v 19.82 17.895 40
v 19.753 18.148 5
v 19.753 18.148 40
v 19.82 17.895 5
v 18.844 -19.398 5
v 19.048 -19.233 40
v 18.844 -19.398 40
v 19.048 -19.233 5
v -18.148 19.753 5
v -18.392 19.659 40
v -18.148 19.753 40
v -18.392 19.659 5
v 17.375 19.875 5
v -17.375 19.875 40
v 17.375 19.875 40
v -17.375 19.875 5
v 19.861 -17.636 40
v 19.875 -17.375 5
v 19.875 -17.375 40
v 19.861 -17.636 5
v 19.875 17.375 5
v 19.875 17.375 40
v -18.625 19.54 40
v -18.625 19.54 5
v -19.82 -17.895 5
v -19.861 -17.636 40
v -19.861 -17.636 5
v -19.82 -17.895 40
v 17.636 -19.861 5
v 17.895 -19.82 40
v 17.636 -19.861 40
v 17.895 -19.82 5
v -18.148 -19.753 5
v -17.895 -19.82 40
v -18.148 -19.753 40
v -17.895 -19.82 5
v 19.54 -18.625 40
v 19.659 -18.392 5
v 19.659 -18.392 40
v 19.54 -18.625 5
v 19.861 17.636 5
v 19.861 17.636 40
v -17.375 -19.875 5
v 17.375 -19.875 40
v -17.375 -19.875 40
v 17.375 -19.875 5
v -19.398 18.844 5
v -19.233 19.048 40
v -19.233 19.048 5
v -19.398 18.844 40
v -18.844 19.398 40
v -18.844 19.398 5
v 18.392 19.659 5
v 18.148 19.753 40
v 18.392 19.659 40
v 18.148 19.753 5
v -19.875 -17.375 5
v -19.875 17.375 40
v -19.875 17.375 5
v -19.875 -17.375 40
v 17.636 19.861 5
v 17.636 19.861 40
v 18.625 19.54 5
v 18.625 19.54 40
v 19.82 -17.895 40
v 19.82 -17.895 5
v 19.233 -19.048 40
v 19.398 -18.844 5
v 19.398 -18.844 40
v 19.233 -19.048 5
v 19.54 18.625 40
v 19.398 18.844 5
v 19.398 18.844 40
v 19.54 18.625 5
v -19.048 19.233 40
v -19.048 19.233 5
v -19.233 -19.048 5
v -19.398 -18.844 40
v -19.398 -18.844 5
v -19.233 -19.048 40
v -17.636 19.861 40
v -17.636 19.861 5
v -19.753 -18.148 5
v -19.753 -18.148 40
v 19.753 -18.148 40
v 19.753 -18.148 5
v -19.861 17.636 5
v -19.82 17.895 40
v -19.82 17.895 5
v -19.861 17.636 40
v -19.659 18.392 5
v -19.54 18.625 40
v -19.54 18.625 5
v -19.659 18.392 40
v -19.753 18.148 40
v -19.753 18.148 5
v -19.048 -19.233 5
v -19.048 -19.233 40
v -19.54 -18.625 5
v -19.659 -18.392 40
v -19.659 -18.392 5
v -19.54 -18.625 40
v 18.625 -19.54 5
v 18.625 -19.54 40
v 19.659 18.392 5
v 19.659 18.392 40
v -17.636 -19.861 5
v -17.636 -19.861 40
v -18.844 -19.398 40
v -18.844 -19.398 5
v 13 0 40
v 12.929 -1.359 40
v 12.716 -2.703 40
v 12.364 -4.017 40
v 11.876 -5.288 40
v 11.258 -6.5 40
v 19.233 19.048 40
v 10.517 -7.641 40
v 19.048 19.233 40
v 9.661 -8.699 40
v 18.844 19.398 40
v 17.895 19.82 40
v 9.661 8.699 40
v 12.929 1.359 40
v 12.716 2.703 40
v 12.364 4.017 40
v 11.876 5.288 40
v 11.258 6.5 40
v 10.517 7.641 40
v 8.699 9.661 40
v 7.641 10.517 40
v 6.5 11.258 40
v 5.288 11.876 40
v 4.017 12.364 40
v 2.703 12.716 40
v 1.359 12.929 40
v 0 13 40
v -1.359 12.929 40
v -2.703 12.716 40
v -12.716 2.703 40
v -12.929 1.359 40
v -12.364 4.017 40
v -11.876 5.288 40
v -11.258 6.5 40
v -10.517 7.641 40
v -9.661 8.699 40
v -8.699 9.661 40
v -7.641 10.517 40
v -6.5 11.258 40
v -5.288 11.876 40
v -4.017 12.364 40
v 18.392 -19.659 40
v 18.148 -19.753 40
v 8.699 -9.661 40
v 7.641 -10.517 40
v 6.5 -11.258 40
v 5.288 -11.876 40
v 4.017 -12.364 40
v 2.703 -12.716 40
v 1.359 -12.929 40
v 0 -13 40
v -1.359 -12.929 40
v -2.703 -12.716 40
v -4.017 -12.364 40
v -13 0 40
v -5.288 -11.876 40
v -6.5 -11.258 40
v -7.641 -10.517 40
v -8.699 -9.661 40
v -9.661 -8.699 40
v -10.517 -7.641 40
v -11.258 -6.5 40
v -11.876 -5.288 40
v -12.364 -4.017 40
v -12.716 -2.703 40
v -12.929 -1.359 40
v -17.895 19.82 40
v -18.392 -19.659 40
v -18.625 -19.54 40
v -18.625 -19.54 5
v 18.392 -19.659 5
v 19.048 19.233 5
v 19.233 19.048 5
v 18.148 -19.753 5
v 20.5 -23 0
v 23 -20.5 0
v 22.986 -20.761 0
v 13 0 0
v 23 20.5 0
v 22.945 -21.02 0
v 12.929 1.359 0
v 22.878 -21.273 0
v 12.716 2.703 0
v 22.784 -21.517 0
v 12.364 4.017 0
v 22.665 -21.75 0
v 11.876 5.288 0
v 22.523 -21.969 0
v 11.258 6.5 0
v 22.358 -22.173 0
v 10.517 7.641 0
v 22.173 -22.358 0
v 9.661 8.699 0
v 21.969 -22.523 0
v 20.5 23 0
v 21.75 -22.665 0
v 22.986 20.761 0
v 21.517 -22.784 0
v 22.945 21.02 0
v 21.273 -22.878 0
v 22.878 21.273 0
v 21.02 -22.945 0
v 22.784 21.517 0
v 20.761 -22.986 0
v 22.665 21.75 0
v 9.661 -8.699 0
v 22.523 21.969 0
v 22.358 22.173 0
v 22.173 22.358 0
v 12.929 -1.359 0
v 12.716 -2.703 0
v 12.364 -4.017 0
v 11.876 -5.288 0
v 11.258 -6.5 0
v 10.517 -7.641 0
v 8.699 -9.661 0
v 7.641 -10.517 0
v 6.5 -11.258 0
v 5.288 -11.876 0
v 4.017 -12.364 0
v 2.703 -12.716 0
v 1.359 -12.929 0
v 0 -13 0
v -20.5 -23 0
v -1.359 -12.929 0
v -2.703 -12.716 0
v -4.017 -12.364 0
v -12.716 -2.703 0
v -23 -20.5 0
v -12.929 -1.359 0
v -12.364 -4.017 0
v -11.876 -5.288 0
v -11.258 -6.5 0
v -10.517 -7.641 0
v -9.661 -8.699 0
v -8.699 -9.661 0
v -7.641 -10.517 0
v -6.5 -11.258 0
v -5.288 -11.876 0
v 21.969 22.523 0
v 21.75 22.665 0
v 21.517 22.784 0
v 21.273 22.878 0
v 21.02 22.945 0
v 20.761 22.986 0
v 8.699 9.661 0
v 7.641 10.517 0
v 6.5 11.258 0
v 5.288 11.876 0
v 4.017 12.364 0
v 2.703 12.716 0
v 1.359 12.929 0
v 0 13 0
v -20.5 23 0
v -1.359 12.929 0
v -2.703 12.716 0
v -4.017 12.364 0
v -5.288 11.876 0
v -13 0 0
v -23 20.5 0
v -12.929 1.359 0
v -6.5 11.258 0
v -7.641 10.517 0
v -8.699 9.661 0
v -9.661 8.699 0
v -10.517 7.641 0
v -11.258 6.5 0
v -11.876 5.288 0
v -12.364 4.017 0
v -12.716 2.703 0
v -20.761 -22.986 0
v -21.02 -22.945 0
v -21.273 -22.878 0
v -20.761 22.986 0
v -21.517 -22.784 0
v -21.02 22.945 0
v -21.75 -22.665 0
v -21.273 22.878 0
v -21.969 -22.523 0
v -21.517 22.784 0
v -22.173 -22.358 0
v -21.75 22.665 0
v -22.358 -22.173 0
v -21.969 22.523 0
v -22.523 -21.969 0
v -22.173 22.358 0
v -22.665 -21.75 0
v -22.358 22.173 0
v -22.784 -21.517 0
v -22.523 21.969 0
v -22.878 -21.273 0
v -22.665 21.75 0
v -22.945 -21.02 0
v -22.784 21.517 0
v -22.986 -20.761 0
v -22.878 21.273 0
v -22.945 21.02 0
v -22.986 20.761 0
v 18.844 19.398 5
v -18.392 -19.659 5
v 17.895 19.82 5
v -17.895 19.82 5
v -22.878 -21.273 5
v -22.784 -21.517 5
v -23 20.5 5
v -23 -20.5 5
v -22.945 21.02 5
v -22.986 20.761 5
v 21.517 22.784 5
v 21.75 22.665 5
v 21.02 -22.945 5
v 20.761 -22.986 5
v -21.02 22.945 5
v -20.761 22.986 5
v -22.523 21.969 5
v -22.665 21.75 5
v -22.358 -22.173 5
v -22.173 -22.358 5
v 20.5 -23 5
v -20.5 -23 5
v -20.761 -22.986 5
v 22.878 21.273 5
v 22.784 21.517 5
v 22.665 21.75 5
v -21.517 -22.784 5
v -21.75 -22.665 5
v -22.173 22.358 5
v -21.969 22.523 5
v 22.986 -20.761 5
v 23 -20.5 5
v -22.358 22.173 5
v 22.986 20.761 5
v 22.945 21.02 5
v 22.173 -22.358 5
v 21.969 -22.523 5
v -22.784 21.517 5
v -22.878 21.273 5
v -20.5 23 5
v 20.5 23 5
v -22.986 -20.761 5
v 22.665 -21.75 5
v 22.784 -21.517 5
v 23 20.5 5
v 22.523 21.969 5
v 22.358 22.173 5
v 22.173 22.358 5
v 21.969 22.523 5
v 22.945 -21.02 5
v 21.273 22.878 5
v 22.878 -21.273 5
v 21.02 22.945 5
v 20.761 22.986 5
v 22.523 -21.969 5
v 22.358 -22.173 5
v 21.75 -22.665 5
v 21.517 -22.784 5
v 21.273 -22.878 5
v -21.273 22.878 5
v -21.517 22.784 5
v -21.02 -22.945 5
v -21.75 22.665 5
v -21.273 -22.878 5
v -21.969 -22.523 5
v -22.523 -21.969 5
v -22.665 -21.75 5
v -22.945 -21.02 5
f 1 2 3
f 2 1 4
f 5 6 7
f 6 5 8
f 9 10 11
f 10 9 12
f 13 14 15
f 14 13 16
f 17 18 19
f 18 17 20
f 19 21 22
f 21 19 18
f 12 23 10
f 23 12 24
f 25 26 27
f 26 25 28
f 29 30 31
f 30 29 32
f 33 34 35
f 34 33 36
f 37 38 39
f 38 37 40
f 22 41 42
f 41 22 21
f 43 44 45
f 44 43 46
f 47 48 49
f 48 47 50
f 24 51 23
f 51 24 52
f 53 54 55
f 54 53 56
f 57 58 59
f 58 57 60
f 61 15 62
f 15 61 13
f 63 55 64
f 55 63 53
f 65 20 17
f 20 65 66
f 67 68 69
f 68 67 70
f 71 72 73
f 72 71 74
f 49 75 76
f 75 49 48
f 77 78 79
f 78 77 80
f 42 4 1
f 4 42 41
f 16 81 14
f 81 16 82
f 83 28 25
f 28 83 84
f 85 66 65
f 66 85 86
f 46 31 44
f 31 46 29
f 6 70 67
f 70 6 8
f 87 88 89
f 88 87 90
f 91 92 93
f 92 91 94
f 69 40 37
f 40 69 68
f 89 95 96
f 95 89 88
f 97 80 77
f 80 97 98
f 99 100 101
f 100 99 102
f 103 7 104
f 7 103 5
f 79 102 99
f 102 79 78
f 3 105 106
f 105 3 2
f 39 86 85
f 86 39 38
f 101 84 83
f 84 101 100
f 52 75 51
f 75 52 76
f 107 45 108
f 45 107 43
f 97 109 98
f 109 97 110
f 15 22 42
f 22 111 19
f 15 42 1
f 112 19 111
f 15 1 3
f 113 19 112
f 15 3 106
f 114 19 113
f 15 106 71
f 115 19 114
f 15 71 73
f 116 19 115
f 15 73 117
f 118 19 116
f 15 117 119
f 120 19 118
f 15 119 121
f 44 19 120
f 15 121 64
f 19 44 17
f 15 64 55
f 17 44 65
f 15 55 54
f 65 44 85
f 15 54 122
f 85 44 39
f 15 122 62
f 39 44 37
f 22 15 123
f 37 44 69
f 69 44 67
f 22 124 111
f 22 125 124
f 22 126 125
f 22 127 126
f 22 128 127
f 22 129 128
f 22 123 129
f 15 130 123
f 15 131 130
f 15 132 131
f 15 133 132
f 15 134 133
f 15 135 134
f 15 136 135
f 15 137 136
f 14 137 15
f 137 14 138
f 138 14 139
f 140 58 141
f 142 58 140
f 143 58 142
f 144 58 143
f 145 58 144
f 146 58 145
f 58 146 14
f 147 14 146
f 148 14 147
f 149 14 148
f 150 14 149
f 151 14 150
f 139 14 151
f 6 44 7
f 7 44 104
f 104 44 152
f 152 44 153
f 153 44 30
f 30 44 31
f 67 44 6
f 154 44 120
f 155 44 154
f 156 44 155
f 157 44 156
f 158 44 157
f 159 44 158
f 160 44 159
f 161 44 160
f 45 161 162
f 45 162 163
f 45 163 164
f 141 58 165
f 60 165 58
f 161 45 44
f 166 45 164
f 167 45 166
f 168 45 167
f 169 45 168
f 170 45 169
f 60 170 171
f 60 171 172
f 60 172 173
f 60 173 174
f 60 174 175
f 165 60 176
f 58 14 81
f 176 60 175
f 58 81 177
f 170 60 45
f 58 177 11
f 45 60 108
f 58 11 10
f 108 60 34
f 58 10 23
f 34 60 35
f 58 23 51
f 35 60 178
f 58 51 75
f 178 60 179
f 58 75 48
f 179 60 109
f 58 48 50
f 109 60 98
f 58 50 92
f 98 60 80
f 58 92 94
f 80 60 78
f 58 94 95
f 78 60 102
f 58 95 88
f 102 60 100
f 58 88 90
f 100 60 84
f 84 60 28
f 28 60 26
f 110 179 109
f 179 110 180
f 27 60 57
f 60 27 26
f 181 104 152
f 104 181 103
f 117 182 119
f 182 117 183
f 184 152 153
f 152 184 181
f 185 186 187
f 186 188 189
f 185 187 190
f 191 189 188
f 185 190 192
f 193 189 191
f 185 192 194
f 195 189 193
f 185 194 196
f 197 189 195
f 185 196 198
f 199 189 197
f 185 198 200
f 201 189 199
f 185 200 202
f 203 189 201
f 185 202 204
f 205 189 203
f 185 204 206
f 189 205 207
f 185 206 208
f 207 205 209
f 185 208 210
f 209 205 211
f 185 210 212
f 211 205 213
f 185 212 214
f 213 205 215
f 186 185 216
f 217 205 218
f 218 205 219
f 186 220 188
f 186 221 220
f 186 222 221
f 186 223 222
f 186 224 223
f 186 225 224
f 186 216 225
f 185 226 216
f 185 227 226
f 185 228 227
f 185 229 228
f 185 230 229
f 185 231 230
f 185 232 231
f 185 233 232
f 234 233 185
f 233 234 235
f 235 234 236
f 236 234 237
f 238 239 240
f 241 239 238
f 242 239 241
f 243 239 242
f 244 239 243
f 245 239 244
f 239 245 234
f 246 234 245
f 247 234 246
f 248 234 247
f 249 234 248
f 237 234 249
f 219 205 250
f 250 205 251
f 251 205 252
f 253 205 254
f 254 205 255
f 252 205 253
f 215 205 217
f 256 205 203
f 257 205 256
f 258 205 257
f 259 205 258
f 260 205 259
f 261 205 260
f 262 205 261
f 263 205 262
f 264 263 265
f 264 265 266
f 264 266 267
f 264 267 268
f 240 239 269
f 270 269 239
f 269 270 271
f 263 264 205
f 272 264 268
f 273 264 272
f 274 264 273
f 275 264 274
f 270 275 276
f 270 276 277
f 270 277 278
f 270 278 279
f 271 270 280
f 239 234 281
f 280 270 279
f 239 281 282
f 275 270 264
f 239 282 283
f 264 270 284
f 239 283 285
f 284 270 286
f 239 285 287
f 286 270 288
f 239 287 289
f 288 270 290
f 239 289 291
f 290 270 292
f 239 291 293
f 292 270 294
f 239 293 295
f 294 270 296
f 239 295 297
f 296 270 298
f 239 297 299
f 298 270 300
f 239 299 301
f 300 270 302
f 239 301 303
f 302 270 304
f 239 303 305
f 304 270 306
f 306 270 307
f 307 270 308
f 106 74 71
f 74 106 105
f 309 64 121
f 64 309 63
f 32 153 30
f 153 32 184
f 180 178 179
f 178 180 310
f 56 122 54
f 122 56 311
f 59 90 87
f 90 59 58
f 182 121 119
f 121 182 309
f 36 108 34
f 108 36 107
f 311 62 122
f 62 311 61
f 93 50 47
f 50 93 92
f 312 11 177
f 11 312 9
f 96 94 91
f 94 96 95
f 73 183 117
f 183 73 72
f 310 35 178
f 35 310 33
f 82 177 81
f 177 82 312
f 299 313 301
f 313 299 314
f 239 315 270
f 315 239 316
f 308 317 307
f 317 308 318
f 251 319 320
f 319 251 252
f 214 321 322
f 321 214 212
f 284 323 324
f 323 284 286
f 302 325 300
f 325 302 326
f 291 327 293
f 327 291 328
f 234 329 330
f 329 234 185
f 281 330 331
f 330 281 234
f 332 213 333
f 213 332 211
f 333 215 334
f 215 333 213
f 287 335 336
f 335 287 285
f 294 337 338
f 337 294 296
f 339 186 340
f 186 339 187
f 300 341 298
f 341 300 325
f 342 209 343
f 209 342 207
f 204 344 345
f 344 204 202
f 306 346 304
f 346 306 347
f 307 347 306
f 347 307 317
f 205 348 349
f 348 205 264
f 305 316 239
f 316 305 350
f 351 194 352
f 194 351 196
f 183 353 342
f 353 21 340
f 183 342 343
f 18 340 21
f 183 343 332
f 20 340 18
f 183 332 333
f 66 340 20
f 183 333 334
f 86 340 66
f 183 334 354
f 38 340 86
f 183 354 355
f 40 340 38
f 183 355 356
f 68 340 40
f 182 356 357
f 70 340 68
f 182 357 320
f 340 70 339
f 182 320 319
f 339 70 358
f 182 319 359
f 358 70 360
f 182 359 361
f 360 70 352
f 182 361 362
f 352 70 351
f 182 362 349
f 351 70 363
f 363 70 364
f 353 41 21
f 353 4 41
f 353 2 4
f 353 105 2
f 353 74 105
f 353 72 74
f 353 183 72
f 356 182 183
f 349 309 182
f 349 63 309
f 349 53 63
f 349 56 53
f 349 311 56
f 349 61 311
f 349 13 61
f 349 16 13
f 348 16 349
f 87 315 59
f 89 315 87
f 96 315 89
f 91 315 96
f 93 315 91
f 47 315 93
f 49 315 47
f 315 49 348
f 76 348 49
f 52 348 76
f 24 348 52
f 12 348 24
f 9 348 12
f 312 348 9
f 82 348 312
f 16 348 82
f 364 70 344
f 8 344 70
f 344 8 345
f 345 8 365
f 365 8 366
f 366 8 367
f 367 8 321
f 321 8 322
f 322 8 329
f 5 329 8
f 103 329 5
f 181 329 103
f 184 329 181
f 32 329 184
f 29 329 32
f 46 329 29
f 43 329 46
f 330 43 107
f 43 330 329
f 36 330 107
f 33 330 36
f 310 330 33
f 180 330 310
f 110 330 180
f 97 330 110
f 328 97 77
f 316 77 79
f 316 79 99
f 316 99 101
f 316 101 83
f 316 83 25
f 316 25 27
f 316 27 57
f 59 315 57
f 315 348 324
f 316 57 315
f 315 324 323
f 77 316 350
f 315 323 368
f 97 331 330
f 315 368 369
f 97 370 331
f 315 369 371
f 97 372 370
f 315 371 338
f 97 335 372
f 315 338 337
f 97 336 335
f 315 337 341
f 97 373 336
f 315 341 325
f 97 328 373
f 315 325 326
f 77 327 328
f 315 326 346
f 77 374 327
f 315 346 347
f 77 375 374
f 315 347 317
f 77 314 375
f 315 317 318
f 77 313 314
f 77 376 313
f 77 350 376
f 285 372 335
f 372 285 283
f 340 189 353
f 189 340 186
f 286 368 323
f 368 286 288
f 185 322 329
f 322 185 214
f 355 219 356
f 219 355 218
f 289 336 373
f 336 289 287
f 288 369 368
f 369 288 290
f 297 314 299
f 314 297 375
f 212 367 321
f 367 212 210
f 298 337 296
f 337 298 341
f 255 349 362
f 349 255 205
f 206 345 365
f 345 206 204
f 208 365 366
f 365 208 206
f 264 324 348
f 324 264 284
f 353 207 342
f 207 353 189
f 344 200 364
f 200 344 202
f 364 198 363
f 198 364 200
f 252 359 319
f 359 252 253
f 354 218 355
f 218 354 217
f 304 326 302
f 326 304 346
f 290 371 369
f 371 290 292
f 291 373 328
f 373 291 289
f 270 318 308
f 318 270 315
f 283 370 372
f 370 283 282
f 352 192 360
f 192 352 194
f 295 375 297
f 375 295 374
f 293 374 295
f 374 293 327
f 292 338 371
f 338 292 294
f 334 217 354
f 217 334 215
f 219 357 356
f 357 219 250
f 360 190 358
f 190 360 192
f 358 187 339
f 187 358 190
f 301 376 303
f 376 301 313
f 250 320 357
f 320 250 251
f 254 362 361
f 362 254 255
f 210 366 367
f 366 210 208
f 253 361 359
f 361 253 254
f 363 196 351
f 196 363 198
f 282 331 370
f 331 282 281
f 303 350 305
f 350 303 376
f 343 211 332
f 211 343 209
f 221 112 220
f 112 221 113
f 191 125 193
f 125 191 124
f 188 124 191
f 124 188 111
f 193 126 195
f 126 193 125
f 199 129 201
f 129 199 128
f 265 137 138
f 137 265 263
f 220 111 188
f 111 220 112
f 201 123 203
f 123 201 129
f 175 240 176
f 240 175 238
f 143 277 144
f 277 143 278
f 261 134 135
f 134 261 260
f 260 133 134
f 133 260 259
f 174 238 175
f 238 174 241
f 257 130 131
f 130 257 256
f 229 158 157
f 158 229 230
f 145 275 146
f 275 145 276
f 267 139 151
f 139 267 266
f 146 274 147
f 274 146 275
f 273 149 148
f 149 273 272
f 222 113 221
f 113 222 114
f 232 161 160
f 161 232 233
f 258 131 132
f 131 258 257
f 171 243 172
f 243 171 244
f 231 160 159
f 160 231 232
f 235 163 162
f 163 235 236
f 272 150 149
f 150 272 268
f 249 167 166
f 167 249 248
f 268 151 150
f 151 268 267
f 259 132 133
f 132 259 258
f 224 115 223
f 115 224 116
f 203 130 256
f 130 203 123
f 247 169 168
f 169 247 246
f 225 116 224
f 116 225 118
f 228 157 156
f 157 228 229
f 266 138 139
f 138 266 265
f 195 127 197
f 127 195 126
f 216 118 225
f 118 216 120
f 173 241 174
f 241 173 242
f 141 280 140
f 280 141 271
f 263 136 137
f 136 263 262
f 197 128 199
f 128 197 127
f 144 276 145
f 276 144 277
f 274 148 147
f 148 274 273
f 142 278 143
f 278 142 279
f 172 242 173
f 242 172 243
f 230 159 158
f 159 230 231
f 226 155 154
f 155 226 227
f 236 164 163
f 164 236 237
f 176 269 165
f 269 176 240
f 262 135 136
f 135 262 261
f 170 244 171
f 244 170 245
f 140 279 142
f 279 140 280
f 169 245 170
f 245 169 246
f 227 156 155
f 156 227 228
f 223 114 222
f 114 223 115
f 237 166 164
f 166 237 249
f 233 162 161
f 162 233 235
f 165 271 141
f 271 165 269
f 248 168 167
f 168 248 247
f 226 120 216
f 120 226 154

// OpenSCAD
ss=39.75;
os=46;
height=40;
round_dia=5;

//%translate([0, 0, 20]) cube([40,40,45], center=true);
difference(){
    union(){
        hull() for(X=[-1,1], Y=[-1,1]){
            translate([(ss/2-(round_dia/2))*X, (ss/2-(round_dia/2))*Y, 0]) cylinder(d=round_dia, h=height, $fn=60);
        }
        hull() for(X=[-1,1], Y=[-1,1]){
            translate([(os/2-(round_dia/2))*X, (os/2-(round_dia/2))*Y, 0]) cylinder(d=round_dia, h=5, $fn=60);
        }
    }
    translate([0,0,-5]) cylinder(d=26, h=height+10, $fn=60, center=false);
}
